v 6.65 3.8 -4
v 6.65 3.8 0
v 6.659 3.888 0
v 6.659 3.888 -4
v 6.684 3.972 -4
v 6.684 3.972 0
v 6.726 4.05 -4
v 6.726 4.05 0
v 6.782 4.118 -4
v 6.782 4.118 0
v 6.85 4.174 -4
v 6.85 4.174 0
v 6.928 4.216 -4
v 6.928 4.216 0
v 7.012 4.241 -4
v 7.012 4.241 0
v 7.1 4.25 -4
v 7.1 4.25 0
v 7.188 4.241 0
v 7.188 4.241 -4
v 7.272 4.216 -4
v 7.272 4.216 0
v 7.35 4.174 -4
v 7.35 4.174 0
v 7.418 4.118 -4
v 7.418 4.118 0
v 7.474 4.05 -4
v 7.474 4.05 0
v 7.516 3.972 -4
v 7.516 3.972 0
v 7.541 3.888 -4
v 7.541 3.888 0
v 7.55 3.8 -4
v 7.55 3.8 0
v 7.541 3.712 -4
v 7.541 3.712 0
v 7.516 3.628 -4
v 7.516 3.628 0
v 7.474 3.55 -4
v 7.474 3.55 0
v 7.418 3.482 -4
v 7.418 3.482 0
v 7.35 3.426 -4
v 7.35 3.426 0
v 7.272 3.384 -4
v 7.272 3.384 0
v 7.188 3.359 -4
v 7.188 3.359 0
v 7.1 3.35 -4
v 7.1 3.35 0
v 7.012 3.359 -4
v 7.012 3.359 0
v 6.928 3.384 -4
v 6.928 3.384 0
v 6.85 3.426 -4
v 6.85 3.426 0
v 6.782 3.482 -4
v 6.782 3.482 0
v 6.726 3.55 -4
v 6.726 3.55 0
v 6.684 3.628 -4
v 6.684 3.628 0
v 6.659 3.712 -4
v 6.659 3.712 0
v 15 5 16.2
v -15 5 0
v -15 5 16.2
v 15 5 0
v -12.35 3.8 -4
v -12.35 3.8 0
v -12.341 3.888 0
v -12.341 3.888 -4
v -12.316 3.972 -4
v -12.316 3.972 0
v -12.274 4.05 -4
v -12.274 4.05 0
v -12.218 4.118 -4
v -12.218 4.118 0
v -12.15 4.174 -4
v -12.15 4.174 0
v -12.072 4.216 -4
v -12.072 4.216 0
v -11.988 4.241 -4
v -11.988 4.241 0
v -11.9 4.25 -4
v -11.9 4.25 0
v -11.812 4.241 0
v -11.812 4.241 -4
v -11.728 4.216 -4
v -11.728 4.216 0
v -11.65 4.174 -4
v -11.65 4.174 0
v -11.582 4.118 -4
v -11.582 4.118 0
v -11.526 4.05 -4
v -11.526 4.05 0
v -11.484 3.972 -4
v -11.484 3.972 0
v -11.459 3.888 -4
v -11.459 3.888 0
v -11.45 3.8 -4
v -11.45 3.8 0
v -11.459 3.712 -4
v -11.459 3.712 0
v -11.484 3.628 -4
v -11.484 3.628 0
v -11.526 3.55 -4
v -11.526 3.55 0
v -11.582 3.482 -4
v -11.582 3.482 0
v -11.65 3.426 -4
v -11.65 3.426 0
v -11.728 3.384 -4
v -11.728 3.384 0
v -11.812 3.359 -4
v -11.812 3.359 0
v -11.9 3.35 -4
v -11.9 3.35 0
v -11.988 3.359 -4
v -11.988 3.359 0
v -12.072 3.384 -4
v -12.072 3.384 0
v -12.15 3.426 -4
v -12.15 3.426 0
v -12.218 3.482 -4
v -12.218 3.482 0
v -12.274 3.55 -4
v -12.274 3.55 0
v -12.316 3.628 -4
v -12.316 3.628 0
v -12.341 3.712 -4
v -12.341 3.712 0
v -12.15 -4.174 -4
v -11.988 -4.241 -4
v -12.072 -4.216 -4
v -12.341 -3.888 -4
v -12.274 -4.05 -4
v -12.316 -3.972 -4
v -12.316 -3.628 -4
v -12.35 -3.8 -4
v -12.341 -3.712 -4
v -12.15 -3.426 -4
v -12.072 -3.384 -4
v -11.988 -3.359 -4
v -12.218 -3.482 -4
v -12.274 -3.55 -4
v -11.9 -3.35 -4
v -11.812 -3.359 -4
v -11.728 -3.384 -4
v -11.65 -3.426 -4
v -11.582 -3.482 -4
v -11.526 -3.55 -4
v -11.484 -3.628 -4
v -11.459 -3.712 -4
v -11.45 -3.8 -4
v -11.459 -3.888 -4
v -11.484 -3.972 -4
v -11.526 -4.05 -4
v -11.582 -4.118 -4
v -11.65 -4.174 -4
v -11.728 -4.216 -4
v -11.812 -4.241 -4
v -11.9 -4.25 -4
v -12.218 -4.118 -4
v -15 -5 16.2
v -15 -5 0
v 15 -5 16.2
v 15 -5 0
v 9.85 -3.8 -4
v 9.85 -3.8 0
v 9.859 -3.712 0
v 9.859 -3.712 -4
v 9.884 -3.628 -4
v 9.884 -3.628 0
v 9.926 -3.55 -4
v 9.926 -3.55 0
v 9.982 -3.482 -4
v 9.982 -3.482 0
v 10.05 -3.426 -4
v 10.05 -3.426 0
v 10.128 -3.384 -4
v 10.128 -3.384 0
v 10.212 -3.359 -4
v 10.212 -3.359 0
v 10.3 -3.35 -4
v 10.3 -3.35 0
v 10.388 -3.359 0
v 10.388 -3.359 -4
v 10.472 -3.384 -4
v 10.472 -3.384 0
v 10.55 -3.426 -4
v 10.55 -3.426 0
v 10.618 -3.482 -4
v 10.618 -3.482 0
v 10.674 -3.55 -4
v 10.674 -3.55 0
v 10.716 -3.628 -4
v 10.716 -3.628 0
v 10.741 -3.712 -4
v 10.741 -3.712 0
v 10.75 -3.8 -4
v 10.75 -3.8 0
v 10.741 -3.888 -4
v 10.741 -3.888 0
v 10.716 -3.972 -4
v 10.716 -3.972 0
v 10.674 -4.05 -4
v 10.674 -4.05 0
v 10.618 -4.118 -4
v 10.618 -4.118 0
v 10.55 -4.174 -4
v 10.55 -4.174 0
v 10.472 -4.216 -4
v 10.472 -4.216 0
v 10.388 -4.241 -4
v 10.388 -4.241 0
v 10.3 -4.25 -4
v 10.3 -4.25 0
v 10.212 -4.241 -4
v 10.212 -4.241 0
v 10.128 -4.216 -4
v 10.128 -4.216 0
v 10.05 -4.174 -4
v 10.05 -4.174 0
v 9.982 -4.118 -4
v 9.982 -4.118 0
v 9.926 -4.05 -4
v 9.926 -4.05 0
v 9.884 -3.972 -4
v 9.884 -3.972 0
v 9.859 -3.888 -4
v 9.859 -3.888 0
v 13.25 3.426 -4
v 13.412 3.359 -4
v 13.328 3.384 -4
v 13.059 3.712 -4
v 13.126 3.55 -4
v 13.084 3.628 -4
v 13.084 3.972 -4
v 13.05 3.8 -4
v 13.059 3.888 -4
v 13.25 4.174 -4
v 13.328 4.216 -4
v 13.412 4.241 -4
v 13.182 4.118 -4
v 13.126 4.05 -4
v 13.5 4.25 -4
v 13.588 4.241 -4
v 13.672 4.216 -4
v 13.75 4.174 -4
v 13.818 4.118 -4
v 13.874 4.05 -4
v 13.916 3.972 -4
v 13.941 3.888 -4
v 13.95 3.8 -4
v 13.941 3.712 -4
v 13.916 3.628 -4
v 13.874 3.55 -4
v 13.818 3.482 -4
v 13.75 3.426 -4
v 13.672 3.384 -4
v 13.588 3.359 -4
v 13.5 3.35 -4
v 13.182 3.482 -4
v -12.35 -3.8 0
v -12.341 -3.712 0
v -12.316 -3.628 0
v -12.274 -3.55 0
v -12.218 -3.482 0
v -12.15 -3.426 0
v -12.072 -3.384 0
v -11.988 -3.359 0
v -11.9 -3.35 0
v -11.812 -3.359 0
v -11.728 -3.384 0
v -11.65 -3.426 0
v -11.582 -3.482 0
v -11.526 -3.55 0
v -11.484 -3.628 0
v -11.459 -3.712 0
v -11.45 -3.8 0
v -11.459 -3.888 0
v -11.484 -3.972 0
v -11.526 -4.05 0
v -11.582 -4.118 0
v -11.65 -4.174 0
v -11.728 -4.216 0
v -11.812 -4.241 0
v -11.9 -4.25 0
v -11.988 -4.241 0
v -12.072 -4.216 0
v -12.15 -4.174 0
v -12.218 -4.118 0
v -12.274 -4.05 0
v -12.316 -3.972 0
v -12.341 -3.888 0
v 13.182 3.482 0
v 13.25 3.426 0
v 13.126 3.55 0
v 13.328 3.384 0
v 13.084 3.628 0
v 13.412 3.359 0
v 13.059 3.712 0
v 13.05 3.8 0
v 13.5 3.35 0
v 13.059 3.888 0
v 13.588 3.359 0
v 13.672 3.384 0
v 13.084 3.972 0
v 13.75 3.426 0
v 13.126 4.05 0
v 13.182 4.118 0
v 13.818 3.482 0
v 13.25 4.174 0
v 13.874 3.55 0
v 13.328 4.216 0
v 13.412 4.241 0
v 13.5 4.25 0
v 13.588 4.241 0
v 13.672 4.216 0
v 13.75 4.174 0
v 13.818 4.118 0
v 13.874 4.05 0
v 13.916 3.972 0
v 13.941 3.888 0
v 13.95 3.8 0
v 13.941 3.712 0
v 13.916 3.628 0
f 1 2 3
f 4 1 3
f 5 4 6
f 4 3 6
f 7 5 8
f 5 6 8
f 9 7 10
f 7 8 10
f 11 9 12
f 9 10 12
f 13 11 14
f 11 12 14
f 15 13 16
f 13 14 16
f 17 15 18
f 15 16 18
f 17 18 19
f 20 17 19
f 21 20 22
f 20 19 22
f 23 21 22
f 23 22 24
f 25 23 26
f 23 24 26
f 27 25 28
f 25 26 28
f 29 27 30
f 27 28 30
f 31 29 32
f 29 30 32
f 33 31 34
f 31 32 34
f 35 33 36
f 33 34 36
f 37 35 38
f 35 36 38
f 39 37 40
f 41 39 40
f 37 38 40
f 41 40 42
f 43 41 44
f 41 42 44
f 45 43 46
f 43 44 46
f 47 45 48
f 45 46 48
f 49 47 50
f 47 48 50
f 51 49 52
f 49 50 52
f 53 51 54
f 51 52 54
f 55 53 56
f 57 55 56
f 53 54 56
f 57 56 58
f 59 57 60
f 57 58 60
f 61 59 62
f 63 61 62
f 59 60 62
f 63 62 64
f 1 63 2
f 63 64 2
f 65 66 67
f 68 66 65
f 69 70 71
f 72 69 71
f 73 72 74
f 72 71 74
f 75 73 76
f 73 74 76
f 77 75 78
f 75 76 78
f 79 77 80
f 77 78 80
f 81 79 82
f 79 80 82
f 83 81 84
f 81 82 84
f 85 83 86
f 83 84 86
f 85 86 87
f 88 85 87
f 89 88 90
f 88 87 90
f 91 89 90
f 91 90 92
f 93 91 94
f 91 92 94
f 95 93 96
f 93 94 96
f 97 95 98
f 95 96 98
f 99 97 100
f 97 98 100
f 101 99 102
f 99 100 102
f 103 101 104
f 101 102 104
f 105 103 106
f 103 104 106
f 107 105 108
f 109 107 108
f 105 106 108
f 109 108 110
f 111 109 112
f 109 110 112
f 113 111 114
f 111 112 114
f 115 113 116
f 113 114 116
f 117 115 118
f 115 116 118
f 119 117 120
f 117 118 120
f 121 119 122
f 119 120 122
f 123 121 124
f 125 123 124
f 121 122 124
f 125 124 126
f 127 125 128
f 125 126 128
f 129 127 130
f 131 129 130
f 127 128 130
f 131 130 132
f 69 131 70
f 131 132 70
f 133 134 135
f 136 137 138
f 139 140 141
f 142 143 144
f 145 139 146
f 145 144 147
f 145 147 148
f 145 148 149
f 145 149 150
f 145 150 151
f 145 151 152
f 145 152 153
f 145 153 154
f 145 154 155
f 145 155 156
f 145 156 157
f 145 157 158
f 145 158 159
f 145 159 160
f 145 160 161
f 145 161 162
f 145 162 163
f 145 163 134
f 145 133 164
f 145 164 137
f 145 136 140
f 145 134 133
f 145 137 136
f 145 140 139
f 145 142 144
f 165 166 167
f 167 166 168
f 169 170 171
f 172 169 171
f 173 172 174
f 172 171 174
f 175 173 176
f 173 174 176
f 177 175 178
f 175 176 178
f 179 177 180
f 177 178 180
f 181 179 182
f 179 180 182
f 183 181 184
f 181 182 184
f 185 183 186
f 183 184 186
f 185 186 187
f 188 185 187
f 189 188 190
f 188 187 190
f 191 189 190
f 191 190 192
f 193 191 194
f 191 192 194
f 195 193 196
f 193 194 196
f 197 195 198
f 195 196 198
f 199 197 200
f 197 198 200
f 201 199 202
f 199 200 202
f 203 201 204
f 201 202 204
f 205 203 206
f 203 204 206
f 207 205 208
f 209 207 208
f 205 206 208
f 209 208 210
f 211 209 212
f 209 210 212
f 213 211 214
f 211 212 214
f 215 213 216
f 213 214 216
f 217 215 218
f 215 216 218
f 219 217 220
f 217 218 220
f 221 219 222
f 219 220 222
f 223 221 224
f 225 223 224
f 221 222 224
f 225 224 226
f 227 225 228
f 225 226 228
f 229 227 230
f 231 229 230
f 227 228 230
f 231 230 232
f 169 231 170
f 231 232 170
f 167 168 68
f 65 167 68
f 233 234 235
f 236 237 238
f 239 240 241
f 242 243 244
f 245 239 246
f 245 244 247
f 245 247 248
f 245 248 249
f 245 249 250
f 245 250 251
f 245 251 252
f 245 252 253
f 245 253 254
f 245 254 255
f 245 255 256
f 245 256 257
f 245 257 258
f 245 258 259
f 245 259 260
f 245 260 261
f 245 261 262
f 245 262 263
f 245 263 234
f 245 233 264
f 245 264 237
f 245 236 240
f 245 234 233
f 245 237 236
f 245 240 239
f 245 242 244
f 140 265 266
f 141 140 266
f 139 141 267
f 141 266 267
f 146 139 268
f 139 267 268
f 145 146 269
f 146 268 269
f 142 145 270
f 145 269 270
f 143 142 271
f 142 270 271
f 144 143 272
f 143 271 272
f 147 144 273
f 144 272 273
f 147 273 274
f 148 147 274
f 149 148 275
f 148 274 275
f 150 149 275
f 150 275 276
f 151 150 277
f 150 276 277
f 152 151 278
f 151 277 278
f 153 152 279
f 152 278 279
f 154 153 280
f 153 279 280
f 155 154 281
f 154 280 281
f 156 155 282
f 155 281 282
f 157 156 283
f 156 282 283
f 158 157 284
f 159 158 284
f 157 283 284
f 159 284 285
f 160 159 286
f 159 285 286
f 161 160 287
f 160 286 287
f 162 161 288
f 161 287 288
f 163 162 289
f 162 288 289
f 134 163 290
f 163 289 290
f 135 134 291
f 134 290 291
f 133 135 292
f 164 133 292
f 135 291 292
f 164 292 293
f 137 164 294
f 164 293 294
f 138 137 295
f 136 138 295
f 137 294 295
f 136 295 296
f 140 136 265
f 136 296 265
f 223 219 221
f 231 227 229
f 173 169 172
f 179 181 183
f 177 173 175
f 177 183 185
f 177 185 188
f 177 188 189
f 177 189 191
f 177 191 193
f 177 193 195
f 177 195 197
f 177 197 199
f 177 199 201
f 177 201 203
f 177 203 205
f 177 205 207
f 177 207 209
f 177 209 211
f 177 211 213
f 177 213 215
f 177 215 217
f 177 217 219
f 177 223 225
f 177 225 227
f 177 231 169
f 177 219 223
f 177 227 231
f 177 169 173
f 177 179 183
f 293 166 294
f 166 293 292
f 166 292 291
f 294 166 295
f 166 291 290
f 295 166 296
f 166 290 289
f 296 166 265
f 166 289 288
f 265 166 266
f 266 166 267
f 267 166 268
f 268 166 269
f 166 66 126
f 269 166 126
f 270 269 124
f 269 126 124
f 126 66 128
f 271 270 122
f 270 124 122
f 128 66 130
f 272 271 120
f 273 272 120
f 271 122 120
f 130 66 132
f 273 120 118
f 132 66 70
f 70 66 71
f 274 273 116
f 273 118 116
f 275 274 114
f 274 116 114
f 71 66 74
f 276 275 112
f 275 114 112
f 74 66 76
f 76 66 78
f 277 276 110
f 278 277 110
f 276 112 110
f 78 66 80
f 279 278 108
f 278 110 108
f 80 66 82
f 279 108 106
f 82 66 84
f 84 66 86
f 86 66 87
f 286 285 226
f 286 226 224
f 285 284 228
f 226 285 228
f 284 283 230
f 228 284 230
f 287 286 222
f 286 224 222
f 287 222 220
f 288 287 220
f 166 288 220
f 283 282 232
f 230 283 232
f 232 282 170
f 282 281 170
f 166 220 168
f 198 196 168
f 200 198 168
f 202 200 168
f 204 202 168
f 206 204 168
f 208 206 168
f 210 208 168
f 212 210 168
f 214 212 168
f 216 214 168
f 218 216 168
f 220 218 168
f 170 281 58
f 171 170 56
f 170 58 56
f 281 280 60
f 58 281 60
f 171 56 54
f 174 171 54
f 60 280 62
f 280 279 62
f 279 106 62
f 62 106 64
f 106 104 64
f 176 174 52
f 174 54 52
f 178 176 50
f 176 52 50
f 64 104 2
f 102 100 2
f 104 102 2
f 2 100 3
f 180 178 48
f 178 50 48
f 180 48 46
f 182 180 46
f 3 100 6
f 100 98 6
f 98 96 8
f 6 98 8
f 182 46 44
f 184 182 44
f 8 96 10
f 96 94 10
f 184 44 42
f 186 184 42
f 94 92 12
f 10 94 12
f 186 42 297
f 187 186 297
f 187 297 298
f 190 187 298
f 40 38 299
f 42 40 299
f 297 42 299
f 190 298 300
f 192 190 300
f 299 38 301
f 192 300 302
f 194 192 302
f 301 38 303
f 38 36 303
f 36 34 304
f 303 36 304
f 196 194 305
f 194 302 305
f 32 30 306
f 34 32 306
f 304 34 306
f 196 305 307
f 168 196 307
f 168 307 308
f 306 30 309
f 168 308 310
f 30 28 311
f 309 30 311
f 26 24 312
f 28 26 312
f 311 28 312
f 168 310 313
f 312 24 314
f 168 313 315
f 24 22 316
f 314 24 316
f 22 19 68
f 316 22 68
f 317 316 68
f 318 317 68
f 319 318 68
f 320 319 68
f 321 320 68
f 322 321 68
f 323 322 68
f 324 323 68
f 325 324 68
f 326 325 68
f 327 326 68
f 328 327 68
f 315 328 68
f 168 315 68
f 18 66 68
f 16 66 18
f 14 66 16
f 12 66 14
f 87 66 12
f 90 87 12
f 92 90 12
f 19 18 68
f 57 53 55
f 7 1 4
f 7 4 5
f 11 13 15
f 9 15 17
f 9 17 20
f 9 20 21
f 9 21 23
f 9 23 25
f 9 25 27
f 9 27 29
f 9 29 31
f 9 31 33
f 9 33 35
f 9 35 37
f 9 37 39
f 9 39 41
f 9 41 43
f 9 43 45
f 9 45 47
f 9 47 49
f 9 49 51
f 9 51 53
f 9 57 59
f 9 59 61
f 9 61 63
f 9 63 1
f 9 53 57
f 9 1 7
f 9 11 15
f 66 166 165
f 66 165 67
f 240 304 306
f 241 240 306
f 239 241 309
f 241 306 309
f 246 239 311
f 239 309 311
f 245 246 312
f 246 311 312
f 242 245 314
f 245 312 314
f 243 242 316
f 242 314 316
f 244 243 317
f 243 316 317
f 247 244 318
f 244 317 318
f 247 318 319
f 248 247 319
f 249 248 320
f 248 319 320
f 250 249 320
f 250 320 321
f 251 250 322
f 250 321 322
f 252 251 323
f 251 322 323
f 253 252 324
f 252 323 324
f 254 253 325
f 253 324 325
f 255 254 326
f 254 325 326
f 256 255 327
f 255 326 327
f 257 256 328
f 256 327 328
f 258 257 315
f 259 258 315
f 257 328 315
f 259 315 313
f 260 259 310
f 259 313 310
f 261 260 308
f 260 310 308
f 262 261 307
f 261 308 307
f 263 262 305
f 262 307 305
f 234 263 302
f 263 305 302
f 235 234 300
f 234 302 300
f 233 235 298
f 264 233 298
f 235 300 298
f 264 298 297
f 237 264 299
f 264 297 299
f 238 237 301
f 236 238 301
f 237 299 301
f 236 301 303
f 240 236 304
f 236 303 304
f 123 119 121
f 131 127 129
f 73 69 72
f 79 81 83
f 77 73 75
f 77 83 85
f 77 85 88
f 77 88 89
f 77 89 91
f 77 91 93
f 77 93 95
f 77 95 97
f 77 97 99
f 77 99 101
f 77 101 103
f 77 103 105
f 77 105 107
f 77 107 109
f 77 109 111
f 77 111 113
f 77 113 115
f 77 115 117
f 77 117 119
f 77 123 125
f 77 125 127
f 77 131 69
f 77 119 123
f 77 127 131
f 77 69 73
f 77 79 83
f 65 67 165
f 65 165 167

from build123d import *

# Parameters (mm, degrees)
SKETCH_1_W      = 30
SKETCH_1_H      = 10
EXTRUDE_1_DEPTH = 16.2
SKETCH_2_R      = 0.45
EXTRUDE_2_DEPTH = 4


with BuildPart() as part:
    # Эскиз1 → Бобышка-Вытянуть1 (new body)
    with BuildSketch(Plane.XY):
        Rectangle(SKETCH_1_W, SKETCH_1_H)
    extrude(amount=EXTRUDE_1_DEPTH)

    # Эскиз2 → Бобышка-Вытянуть2 (add)
    with BuildSketch(Plane(origin=(0, 0, 0), x_dir=(-1, 0, 0), z_dir=(0, 0, -1))):
        with Locations((-13.5, 3.8)):
            Circle(SKETCH_2_R)
        with Locations((-7.1, 3.8)):
            Circle(SKETCH_2_R)
        with Locations((-10.3, -3.8)):
            Circle(SKETCH_2_R)
        with Locations((11.9, 3.8)):
            Circle(SKETCH_2_R)
        with Locations((11.9, -3.8)):
            Circle(SKETCH_2_R)
    extrude(amount=EXTRUDE_2_DEPTH)


solid = part.part
